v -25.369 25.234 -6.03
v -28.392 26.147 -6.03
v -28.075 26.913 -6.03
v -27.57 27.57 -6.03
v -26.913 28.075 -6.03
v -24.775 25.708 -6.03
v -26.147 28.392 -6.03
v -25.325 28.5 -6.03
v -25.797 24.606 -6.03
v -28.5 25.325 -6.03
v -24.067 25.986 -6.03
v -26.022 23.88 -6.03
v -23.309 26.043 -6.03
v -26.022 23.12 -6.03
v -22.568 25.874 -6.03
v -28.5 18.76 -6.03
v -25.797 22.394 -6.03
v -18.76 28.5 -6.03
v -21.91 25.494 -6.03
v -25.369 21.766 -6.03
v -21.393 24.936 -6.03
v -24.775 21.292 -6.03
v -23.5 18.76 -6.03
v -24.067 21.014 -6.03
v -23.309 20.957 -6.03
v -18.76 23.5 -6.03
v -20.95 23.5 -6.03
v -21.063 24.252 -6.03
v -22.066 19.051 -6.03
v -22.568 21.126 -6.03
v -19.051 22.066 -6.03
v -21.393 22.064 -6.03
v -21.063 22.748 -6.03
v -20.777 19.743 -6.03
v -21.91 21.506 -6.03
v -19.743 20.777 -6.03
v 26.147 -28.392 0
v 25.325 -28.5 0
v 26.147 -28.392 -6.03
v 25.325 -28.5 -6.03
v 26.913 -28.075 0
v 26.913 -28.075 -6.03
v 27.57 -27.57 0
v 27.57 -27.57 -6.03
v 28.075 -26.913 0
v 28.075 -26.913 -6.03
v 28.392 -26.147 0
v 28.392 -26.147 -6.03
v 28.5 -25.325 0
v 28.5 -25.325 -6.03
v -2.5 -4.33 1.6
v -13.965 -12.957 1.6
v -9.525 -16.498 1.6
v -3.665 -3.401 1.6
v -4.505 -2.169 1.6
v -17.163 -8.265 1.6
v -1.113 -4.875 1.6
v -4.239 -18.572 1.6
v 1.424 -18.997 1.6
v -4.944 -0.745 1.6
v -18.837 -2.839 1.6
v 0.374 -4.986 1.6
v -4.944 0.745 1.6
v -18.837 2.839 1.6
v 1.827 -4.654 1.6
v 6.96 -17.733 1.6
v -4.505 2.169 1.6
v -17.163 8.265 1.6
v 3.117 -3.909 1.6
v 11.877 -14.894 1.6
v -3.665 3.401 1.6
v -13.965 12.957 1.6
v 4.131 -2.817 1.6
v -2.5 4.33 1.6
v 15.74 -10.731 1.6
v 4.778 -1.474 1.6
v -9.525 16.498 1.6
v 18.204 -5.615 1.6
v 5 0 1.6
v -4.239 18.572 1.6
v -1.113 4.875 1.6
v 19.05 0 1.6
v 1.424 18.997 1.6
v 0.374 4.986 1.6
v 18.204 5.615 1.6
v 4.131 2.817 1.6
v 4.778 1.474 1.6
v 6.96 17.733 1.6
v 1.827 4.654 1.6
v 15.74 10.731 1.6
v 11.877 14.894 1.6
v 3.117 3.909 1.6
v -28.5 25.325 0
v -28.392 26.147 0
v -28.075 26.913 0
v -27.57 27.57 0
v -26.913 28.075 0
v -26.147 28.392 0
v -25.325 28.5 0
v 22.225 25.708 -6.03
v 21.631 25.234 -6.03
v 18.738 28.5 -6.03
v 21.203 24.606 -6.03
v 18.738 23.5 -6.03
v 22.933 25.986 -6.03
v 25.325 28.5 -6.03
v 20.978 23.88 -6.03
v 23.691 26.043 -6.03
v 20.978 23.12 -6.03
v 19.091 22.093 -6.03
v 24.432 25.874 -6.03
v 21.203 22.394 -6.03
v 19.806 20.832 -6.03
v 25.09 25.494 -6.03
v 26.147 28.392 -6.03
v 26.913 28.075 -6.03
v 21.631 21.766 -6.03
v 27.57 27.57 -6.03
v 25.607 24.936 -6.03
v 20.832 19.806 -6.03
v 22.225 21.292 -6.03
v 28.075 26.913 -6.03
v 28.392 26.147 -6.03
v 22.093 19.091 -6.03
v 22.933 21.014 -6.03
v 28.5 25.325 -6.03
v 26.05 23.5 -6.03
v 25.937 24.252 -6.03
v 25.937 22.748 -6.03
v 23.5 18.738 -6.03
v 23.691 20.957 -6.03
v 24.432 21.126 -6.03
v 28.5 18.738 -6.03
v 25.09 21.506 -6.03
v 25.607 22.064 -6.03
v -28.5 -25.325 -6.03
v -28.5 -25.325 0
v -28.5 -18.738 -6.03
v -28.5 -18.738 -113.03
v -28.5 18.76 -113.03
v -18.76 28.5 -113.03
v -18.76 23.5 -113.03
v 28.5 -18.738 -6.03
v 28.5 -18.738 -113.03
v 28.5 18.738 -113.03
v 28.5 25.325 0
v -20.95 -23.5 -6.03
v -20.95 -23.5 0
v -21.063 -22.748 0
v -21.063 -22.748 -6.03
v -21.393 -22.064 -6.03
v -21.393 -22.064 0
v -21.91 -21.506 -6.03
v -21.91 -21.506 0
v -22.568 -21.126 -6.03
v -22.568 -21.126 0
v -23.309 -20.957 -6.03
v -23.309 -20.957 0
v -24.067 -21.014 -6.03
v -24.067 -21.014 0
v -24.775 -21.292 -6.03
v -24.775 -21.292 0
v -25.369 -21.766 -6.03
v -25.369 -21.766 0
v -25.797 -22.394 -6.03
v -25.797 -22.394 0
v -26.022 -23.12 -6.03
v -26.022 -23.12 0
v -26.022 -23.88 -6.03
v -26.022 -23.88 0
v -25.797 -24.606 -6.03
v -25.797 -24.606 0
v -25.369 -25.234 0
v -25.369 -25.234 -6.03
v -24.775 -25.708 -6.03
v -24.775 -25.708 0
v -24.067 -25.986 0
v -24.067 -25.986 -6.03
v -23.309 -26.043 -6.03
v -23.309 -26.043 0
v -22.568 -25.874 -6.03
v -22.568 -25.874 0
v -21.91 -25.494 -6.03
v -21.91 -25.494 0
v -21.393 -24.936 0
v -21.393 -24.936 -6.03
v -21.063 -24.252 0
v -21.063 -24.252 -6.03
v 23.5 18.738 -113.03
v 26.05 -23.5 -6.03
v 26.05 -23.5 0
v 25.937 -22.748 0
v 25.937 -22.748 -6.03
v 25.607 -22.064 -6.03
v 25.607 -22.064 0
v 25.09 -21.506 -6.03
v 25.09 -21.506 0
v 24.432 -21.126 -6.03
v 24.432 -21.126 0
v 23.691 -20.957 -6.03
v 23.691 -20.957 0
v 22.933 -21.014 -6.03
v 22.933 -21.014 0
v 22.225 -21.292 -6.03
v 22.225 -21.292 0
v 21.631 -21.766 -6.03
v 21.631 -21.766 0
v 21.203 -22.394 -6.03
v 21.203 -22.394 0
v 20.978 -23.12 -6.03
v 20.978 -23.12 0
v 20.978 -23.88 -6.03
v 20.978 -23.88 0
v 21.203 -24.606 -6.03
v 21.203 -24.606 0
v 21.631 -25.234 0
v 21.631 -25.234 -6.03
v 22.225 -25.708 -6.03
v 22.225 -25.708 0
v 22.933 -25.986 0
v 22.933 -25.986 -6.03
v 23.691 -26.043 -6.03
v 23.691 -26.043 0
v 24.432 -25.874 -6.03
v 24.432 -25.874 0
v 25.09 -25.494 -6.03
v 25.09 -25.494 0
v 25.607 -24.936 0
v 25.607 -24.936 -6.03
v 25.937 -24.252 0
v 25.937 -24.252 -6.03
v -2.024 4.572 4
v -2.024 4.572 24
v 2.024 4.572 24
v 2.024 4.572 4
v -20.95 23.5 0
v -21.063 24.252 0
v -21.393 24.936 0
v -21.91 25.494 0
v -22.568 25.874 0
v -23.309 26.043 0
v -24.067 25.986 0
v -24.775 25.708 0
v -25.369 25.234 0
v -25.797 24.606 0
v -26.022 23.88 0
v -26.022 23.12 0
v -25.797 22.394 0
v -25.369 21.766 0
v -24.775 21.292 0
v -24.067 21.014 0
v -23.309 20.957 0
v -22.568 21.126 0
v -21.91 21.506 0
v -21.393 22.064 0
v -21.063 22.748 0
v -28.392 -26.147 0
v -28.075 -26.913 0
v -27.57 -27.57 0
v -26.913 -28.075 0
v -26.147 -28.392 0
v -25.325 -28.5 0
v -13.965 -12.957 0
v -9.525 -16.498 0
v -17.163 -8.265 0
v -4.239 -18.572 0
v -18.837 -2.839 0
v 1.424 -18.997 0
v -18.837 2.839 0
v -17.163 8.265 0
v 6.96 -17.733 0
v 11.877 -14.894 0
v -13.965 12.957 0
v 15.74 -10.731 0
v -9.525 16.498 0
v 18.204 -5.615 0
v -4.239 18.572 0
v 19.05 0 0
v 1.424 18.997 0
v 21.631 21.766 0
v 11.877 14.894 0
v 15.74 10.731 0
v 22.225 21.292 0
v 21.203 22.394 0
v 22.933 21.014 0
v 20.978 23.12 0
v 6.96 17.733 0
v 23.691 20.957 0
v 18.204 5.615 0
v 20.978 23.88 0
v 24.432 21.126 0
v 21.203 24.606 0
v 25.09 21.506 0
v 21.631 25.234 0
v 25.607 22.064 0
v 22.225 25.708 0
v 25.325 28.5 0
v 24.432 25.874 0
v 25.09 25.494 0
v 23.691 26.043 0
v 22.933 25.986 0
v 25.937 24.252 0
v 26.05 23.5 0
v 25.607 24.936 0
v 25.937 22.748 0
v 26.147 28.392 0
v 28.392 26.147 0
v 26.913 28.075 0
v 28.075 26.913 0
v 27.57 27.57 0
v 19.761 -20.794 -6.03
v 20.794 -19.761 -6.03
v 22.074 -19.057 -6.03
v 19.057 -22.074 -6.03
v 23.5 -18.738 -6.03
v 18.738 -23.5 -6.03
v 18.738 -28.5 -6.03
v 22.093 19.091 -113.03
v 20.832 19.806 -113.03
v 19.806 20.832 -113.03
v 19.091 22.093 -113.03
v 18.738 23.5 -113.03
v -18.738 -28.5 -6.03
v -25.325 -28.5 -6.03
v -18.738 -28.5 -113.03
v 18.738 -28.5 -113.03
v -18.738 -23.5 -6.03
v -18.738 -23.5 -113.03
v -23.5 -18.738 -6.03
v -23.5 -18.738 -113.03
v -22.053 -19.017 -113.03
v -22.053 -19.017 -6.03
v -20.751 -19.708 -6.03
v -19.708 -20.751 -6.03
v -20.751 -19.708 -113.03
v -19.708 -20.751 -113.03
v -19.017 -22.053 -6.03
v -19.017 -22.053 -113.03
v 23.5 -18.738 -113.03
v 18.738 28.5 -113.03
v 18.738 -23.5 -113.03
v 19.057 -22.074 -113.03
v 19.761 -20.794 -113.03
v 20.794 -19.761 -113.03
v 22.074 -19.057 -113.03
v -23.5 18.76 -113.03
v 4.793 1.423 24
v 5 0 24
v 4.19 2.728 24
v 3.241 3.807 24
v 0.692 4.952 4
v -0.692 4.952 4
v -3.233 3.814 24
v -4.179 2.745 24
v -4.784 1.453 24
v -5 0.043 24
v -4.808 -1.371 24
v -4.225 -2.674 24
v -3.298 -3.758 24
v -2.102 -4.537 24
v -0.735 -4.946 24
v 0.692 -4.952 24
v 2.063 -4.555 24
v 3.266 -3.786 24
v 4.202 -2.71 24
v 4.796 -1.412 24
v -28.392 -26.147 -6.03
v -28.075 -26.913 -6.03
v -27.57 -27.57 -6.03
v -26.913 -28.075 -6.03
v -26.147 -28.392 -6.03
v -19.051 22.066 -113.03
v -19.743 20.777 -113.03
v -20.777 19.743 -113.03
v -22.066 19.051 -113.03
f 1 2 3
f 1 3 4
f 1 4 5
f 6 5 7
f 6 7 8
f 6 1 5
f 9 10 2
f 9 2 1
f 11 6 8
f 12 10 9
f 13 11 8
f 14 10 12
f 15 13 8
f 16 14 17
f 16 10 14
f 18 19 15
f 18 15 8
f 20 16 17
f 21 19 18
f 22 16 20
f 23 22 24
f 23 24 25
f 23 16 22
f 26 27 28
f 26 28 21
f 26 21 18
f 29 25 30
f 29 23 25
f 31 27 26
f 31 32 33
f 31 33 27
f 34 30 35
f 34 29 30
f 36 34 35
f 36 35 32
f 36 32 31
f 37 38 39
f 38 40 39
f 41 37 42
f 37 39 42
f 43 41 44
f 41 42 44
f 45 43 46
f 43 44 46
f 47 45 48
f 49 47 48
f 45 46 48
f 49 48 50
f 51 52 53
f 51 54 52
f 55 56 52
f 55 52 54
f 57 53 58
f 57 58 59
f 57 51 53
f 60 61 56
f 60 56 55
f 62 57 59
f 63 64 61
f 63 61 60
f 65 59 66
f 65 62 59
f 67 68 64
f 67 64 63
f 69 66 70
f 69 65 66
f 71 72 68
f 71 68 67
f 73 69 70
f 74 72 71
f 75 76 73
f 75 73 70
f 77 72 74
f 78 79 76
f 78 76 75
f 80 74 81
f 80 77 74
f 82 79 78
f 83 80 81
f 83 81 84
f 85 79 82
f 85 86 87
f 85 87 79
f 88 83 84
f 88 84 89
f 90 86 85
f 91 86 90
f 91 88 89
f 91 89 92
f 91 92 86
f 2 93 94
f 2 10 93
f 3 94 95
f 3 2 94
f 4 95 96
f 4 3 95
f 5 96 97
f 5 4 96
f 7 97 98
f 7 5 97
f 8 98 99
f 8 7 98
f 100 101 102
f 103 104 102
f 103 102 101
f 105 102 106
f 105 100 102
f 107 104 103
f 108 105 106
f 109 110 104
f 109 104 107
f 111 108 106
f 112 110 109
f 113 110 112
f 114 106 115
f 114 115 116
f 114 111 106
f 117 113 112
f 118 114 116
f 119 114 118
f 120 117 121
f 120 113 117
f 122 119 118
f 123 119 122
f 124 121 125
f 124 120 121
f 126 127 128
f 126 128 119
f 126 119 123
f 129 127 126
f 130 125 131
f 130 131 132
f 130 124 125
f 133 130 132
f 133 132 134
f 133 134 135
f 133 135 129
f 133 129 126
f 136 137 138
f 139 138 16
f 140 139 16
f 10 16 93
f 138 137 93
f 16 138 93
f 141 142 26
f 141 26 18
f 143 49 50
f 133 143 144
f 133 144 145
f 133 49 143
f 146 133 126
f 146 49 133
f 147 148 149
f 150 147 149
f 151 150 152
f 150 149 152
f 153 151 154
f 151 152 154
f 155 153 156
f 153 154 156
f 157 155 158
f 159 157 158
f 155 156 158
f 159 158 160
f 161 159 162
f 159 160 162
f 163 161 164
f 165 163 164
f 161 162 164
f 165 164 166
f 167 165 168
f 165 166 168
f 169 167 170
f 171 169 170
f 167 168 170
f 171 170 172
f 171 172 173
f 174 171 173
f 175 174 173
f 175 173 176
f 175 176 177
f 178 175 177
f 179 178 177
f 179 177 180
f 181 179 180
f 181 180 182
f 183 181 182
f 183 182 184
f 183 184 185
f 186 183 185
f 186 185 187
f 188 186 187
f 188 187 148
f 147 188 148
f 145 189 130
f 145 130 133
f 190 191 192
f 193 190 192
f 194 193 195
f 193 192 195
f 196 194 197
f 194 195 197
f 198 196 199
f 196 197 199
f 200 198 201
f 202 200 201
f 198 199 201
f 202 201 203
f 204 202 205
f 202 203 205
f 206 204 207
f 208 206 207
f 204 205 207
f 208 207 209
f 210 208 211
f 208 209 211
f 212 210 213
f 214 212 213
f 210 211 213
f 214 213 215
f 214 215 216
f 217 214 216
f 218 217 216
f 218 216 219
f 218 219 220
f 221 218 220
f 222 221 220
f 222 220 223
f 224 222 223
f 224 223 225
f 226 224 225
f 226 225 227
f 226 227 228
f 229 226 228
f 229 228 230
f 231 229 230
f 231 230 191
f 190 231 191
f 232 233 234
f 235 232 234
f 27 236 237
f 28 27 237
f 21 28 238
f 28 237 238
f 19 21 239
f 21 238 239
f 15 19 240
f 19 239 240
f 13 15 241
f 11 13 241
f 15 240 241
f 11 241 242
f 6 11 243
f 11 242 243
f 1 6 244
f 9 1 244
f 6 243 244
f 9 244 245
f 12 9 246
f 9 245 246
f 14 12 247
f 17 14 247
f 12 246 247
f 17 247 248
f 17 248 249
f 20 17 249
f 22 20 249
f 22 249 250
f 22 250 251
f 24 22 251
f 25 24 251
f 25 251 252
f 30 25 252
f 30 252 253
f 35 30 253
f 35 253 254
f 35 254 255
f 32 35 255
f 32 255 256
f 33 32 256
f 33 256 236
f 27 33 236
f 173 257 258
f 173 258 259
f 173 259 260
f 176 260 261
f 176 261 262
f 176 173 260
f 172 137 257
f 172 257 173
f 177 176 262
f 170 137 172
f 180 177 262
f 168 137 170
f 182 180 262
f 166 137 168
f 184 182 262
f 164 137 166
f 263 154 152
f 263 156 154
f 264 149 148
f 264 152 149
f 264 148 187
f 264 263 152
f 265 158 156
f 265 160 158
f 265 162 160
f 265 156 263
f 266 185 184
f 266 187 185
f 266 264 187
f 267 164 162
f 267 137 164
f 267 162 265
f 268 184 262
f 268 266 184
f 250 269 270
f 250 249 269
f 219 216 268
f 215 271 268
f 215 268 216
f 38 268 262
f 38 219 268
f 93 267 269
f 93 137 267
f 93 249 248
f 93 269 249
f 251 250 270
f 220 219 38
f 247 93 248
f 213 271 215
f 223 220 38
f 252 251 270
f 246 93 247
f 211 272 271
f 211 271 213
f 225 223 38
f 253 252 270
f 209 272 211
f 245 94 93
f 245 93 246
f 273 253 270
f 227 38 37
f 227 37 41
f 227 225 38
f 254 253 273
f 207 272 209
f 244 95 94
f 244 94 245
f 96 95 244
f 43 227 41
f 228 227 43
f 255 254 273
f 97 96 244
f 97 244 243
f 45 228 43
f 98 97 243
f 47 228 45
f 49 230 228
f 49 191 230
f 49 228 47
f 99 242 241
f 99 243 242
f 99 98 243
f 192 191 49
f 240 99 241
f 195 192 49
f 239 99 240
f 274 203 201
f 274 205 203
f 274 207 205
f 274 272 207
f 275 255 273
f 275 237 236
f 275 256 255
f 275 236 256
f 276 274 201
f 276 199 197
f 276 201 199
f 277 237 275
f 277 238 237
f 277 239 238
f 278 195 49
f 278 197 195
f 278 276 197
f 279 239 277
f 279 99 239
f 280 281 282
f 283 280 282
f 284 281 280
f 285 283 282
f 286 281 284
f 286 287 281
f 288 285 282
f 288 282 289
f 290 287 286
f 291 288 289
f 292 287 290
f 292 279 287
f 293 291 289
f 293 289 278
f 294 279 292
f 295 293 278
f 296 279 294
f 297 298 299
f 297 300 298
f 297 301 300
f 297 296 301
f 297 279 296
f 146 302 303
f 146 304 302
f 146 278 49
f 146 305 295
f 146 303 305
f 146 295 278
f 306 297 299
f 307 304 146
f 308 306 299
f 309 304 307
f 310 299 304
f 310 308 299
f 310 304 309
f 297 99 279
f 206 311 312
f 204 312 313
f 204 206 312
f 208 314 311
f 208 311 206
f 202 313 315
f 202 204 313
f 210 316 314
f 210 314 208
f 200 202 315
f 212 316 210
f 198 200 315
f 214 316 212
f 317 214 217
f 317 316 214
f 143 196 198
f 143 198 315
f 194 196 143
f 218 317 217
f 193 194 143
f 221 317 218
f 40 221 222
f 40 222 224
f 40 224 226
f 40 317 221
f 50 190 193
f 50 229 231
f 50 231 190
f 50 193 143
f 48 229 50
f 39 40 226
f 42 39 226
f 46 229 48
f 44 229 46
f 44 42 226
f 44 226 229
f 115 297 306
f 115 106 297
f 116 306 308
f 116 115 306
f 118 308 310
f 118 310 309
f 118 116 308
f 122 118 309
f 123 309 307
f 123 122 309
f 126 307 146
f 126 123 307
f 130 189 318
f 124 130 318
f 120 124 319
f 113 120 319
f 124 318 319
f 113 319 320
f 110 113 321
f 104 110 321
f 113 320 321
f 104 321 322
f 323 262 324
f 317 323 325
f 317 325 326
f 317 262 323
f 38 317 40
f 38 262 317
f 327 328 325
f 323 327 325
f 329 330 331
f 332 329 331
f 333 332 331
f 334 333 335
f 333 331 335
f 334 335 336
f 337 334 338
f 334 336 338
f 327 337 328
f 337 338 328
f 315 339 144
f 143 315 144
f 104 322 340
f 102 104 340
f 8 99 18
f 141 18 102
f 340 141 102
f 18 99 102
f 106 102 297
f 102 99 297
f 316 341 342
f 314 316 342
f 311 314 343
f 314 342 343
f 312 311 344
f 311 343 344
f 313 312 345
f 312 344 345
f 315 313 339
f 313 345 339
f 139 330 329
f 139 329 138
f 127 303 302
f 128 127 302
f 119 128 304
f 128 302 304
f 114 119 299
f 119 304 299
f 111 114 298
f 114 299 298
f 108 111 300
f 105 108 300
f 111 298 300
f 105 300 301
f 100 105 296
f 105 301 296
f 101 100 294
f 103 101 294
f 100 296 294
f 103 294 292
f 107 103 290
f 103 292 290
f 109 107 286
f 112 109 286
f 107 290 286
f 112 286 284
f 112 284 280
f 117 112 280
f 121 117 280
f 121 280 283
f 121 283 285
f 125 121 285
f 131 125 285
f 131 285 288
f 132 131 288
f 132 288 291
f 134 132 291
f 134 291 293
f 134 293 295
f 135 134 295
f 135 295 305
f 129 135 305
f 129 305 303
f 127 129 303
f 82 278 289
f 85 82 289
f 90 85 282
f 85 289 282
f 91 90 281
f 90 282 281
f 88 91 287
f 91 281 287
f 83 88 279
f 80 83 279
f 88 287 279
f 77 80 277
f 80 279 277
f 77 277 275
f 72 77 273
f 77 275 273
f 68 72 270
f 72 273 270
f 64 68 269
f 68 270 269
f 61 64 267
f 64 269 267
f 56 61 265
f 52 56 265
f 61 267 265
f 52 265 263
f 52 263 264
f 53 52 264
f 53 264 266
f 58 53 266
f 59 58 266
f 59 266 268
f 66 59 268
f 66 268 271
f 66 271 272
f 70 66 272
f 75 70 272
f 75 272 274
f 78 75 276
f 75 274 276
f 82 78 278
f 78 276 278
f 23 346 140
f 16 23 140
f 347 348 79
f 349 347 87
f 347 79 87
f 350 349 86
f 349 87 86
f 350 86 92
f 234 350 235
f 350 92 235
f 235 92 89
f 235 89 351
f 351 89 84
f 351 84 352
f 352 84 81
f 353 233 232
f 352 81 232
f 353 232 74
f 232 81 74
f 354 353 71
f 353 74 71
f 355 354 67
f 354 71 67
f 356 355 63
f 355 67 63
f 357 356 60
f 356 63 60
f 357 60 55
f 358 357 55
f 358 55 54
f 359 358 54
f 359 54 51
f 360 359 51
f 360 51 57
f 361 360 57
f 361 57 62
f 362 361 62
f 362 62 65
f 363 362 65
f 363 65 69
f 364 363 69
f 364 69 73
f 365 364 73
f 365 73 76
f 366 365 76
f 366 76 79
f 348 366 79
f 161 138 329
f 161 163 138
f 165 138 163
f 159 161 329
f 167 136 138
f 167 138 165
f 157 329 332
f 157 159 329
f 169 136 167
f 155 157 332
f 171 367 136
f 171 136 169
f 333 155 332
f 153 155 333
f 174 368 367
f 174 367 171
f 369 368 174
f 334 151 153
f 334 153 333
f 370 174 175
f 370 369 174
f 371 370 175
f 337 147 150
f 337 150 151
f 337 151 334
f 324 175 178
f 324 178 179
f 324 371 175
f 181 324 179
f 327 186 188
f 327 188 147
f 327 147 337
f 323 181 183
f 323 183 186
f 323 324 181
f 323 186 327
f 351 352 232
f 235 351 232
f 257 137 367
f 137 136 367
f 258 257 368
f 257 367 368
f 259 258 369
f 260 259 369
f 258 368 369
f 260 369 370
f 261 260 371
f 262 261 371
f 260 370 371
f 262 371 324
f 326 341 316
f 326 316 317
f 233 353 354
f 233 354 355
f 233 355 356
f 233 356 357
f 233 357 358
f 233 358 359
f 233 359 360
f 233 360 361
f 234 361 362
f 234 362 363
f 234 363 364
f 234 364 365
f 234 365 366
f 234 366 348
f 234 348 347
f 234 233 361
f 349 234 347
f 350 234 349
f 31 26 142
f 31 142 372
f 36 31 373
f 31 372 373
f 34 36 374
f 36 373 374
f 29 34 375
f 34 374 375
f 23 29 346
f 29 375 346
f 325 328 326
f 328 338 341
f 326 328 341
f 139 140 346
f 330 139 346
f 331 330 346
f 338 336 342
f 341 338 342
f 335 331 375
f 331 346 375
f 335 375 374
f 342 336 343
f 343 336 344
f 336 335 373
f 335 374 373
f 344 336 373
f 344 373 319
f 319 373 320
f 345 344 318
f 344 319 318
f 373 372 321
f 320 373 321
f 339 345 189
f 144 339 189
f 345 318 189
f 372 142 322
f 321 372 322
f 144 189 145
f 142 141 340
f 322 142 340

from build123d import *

# Parameters (mm, degrees)
SKETCH_W        = 57.00014
SKETCH_H        = 57.00014
SKETCH_R        = 2.55
PAD_DEPTH       = 113.03
POCKET_DEPTH    = 107
SKETCH002_R     = 19.05
PAD001_DEPTH    = 1.6
SKETCH003_R     = 5
PAD002_DEPTH    = 24
FILLET_R        = 3.175
SKETCH004_W     = 30.604006
SKETCH004_H     = 8.312313
POCKET001_DEPTH = 20


with BuildPart() as part:
    # Sketch → Pad (new body)
    with BuildSketch(Plane.XY):
        Rectangle(SKETCH_W, SKETCH_H)
        with Locations((-23.5, 23.5)):
            Circle(SKETCH_R, mode=Mode.SUBTRACT)
        with Locations((23.5, 23.5)):
            Circle(SKETCH_R, mode=Mode.SUBTRACT)
        with Locations((-23.5, -23.5)):
            Circle(SKETCH_R, mode=Mode.SUBTRACT)
        with Locations((23.5, -23.5)):
            Circle(SKETCH_R, mode=Mode.SUBTRACT)
    extrude(amount=-PAD_DEPTH)

    # Sketch001 (on Face10 of Pad) → Pocket (cut)
    with BuildSketch(Plane(origin=(0, 0, -113.03), x_dir=(1, 0, 0), z_dir=(0, 0, -1))):
        with BuildLine():
            Line((-18.7375, 23.5), (-18.7375, 31.75))
            Line((-18.7375, 31.75), (-31.75, 31.75))
            Line((-31.75, 18.7375), (-31.75, 31.75))
            Line((-23.5, 18.7375), (-31.75, 18.7375))
            ThreePointArc((-23.5, 18.7375), (-20.190744, 20.190744), (-18.7375, 23.5))
        make_face()
        with BuildLine():
            Line((23.5, 18.7375), (31.75, 18.7375))
            Line((31.75, 18.7375), (31.75, 31.75))
            Line((18.7375, 31.75), (31.75, 31.75))
            Line((18.7375, 23.5), (18.7375, 31.75))
            ThreePointArc((18.7375, 23.5), (20.240641, 20.240641), (23.5, 18.7375))
        make_face()
        with BuildLine():
            Line((18.7375, -23.5), (18.7375, -31.75))
            Line((18.7375, -31.75), (31.75, -31.75))
            Line((31.75, -18.7375), (31.75, -31.75))
            Line((23.5, -18.7375), (31.75, -18.7375))
            ThreePointArc((23.5, -18.7375), (20.284094, -20.284094), (18.7375, -23.5))
        make_face()
        with BuildLine():
            Line((-23.5, -18.759919), (-31.75, -18.759919))
            Line((-31.75, -18.759919), (-31.75, -31.75))
            Line((-18.759919, -31.75), (-31.75, -31.75))
            Line((-18.759919, -23.5), (-18.759919, -31.75))
            ThreePointArc((-18.759919, -23.5), (-20.221862, -20.221862), (-23.5, -18.759919))
        make_face()
    extrude(amount=-POCKET_DEPTH, mode=Mode.SUBTRACT)

    # Sketch002 (on Face2 of Pocket) → Pad001 (join)
    with BuildSketch(Plane.XY):
        Circle(SKETCH002_R)
    extrude(amount=PAD001_DEPTH)

    # Sketch003 (on Face2 of Pad001) → Pad002 (join)
    with BuildSketch(Plane.XY):
        Circle(SKETCH003_R)
    extrude(amount=PAD002_DEPTH)

    # Fillet
    fillet_edges = [part.edges().sort_by_distance(p)[0] for p in [
        (28.50007, 28.50007, -3.015),
        (28.50007, -28.50007, -3.015),
        (-28.50007, 28.50007, -3.015),
        (-28.50007, -28.50007, -3.015),
    ]]
    fillet(fillet_edges, radius=FILLET_R)

    # Sketch004 (on Face34 of Fillet) → Pocket001 (cut)
    with BuildSketch(Plane.XY.offset(24)):
        with Locations((0, 8.728156)):
            Rectangle(SKETCH004_W, SKETCH004_H)
    extrude(amount=-POCKET001_DEPTH, mode=Mode.SUBTRACT)


solid = part.part
